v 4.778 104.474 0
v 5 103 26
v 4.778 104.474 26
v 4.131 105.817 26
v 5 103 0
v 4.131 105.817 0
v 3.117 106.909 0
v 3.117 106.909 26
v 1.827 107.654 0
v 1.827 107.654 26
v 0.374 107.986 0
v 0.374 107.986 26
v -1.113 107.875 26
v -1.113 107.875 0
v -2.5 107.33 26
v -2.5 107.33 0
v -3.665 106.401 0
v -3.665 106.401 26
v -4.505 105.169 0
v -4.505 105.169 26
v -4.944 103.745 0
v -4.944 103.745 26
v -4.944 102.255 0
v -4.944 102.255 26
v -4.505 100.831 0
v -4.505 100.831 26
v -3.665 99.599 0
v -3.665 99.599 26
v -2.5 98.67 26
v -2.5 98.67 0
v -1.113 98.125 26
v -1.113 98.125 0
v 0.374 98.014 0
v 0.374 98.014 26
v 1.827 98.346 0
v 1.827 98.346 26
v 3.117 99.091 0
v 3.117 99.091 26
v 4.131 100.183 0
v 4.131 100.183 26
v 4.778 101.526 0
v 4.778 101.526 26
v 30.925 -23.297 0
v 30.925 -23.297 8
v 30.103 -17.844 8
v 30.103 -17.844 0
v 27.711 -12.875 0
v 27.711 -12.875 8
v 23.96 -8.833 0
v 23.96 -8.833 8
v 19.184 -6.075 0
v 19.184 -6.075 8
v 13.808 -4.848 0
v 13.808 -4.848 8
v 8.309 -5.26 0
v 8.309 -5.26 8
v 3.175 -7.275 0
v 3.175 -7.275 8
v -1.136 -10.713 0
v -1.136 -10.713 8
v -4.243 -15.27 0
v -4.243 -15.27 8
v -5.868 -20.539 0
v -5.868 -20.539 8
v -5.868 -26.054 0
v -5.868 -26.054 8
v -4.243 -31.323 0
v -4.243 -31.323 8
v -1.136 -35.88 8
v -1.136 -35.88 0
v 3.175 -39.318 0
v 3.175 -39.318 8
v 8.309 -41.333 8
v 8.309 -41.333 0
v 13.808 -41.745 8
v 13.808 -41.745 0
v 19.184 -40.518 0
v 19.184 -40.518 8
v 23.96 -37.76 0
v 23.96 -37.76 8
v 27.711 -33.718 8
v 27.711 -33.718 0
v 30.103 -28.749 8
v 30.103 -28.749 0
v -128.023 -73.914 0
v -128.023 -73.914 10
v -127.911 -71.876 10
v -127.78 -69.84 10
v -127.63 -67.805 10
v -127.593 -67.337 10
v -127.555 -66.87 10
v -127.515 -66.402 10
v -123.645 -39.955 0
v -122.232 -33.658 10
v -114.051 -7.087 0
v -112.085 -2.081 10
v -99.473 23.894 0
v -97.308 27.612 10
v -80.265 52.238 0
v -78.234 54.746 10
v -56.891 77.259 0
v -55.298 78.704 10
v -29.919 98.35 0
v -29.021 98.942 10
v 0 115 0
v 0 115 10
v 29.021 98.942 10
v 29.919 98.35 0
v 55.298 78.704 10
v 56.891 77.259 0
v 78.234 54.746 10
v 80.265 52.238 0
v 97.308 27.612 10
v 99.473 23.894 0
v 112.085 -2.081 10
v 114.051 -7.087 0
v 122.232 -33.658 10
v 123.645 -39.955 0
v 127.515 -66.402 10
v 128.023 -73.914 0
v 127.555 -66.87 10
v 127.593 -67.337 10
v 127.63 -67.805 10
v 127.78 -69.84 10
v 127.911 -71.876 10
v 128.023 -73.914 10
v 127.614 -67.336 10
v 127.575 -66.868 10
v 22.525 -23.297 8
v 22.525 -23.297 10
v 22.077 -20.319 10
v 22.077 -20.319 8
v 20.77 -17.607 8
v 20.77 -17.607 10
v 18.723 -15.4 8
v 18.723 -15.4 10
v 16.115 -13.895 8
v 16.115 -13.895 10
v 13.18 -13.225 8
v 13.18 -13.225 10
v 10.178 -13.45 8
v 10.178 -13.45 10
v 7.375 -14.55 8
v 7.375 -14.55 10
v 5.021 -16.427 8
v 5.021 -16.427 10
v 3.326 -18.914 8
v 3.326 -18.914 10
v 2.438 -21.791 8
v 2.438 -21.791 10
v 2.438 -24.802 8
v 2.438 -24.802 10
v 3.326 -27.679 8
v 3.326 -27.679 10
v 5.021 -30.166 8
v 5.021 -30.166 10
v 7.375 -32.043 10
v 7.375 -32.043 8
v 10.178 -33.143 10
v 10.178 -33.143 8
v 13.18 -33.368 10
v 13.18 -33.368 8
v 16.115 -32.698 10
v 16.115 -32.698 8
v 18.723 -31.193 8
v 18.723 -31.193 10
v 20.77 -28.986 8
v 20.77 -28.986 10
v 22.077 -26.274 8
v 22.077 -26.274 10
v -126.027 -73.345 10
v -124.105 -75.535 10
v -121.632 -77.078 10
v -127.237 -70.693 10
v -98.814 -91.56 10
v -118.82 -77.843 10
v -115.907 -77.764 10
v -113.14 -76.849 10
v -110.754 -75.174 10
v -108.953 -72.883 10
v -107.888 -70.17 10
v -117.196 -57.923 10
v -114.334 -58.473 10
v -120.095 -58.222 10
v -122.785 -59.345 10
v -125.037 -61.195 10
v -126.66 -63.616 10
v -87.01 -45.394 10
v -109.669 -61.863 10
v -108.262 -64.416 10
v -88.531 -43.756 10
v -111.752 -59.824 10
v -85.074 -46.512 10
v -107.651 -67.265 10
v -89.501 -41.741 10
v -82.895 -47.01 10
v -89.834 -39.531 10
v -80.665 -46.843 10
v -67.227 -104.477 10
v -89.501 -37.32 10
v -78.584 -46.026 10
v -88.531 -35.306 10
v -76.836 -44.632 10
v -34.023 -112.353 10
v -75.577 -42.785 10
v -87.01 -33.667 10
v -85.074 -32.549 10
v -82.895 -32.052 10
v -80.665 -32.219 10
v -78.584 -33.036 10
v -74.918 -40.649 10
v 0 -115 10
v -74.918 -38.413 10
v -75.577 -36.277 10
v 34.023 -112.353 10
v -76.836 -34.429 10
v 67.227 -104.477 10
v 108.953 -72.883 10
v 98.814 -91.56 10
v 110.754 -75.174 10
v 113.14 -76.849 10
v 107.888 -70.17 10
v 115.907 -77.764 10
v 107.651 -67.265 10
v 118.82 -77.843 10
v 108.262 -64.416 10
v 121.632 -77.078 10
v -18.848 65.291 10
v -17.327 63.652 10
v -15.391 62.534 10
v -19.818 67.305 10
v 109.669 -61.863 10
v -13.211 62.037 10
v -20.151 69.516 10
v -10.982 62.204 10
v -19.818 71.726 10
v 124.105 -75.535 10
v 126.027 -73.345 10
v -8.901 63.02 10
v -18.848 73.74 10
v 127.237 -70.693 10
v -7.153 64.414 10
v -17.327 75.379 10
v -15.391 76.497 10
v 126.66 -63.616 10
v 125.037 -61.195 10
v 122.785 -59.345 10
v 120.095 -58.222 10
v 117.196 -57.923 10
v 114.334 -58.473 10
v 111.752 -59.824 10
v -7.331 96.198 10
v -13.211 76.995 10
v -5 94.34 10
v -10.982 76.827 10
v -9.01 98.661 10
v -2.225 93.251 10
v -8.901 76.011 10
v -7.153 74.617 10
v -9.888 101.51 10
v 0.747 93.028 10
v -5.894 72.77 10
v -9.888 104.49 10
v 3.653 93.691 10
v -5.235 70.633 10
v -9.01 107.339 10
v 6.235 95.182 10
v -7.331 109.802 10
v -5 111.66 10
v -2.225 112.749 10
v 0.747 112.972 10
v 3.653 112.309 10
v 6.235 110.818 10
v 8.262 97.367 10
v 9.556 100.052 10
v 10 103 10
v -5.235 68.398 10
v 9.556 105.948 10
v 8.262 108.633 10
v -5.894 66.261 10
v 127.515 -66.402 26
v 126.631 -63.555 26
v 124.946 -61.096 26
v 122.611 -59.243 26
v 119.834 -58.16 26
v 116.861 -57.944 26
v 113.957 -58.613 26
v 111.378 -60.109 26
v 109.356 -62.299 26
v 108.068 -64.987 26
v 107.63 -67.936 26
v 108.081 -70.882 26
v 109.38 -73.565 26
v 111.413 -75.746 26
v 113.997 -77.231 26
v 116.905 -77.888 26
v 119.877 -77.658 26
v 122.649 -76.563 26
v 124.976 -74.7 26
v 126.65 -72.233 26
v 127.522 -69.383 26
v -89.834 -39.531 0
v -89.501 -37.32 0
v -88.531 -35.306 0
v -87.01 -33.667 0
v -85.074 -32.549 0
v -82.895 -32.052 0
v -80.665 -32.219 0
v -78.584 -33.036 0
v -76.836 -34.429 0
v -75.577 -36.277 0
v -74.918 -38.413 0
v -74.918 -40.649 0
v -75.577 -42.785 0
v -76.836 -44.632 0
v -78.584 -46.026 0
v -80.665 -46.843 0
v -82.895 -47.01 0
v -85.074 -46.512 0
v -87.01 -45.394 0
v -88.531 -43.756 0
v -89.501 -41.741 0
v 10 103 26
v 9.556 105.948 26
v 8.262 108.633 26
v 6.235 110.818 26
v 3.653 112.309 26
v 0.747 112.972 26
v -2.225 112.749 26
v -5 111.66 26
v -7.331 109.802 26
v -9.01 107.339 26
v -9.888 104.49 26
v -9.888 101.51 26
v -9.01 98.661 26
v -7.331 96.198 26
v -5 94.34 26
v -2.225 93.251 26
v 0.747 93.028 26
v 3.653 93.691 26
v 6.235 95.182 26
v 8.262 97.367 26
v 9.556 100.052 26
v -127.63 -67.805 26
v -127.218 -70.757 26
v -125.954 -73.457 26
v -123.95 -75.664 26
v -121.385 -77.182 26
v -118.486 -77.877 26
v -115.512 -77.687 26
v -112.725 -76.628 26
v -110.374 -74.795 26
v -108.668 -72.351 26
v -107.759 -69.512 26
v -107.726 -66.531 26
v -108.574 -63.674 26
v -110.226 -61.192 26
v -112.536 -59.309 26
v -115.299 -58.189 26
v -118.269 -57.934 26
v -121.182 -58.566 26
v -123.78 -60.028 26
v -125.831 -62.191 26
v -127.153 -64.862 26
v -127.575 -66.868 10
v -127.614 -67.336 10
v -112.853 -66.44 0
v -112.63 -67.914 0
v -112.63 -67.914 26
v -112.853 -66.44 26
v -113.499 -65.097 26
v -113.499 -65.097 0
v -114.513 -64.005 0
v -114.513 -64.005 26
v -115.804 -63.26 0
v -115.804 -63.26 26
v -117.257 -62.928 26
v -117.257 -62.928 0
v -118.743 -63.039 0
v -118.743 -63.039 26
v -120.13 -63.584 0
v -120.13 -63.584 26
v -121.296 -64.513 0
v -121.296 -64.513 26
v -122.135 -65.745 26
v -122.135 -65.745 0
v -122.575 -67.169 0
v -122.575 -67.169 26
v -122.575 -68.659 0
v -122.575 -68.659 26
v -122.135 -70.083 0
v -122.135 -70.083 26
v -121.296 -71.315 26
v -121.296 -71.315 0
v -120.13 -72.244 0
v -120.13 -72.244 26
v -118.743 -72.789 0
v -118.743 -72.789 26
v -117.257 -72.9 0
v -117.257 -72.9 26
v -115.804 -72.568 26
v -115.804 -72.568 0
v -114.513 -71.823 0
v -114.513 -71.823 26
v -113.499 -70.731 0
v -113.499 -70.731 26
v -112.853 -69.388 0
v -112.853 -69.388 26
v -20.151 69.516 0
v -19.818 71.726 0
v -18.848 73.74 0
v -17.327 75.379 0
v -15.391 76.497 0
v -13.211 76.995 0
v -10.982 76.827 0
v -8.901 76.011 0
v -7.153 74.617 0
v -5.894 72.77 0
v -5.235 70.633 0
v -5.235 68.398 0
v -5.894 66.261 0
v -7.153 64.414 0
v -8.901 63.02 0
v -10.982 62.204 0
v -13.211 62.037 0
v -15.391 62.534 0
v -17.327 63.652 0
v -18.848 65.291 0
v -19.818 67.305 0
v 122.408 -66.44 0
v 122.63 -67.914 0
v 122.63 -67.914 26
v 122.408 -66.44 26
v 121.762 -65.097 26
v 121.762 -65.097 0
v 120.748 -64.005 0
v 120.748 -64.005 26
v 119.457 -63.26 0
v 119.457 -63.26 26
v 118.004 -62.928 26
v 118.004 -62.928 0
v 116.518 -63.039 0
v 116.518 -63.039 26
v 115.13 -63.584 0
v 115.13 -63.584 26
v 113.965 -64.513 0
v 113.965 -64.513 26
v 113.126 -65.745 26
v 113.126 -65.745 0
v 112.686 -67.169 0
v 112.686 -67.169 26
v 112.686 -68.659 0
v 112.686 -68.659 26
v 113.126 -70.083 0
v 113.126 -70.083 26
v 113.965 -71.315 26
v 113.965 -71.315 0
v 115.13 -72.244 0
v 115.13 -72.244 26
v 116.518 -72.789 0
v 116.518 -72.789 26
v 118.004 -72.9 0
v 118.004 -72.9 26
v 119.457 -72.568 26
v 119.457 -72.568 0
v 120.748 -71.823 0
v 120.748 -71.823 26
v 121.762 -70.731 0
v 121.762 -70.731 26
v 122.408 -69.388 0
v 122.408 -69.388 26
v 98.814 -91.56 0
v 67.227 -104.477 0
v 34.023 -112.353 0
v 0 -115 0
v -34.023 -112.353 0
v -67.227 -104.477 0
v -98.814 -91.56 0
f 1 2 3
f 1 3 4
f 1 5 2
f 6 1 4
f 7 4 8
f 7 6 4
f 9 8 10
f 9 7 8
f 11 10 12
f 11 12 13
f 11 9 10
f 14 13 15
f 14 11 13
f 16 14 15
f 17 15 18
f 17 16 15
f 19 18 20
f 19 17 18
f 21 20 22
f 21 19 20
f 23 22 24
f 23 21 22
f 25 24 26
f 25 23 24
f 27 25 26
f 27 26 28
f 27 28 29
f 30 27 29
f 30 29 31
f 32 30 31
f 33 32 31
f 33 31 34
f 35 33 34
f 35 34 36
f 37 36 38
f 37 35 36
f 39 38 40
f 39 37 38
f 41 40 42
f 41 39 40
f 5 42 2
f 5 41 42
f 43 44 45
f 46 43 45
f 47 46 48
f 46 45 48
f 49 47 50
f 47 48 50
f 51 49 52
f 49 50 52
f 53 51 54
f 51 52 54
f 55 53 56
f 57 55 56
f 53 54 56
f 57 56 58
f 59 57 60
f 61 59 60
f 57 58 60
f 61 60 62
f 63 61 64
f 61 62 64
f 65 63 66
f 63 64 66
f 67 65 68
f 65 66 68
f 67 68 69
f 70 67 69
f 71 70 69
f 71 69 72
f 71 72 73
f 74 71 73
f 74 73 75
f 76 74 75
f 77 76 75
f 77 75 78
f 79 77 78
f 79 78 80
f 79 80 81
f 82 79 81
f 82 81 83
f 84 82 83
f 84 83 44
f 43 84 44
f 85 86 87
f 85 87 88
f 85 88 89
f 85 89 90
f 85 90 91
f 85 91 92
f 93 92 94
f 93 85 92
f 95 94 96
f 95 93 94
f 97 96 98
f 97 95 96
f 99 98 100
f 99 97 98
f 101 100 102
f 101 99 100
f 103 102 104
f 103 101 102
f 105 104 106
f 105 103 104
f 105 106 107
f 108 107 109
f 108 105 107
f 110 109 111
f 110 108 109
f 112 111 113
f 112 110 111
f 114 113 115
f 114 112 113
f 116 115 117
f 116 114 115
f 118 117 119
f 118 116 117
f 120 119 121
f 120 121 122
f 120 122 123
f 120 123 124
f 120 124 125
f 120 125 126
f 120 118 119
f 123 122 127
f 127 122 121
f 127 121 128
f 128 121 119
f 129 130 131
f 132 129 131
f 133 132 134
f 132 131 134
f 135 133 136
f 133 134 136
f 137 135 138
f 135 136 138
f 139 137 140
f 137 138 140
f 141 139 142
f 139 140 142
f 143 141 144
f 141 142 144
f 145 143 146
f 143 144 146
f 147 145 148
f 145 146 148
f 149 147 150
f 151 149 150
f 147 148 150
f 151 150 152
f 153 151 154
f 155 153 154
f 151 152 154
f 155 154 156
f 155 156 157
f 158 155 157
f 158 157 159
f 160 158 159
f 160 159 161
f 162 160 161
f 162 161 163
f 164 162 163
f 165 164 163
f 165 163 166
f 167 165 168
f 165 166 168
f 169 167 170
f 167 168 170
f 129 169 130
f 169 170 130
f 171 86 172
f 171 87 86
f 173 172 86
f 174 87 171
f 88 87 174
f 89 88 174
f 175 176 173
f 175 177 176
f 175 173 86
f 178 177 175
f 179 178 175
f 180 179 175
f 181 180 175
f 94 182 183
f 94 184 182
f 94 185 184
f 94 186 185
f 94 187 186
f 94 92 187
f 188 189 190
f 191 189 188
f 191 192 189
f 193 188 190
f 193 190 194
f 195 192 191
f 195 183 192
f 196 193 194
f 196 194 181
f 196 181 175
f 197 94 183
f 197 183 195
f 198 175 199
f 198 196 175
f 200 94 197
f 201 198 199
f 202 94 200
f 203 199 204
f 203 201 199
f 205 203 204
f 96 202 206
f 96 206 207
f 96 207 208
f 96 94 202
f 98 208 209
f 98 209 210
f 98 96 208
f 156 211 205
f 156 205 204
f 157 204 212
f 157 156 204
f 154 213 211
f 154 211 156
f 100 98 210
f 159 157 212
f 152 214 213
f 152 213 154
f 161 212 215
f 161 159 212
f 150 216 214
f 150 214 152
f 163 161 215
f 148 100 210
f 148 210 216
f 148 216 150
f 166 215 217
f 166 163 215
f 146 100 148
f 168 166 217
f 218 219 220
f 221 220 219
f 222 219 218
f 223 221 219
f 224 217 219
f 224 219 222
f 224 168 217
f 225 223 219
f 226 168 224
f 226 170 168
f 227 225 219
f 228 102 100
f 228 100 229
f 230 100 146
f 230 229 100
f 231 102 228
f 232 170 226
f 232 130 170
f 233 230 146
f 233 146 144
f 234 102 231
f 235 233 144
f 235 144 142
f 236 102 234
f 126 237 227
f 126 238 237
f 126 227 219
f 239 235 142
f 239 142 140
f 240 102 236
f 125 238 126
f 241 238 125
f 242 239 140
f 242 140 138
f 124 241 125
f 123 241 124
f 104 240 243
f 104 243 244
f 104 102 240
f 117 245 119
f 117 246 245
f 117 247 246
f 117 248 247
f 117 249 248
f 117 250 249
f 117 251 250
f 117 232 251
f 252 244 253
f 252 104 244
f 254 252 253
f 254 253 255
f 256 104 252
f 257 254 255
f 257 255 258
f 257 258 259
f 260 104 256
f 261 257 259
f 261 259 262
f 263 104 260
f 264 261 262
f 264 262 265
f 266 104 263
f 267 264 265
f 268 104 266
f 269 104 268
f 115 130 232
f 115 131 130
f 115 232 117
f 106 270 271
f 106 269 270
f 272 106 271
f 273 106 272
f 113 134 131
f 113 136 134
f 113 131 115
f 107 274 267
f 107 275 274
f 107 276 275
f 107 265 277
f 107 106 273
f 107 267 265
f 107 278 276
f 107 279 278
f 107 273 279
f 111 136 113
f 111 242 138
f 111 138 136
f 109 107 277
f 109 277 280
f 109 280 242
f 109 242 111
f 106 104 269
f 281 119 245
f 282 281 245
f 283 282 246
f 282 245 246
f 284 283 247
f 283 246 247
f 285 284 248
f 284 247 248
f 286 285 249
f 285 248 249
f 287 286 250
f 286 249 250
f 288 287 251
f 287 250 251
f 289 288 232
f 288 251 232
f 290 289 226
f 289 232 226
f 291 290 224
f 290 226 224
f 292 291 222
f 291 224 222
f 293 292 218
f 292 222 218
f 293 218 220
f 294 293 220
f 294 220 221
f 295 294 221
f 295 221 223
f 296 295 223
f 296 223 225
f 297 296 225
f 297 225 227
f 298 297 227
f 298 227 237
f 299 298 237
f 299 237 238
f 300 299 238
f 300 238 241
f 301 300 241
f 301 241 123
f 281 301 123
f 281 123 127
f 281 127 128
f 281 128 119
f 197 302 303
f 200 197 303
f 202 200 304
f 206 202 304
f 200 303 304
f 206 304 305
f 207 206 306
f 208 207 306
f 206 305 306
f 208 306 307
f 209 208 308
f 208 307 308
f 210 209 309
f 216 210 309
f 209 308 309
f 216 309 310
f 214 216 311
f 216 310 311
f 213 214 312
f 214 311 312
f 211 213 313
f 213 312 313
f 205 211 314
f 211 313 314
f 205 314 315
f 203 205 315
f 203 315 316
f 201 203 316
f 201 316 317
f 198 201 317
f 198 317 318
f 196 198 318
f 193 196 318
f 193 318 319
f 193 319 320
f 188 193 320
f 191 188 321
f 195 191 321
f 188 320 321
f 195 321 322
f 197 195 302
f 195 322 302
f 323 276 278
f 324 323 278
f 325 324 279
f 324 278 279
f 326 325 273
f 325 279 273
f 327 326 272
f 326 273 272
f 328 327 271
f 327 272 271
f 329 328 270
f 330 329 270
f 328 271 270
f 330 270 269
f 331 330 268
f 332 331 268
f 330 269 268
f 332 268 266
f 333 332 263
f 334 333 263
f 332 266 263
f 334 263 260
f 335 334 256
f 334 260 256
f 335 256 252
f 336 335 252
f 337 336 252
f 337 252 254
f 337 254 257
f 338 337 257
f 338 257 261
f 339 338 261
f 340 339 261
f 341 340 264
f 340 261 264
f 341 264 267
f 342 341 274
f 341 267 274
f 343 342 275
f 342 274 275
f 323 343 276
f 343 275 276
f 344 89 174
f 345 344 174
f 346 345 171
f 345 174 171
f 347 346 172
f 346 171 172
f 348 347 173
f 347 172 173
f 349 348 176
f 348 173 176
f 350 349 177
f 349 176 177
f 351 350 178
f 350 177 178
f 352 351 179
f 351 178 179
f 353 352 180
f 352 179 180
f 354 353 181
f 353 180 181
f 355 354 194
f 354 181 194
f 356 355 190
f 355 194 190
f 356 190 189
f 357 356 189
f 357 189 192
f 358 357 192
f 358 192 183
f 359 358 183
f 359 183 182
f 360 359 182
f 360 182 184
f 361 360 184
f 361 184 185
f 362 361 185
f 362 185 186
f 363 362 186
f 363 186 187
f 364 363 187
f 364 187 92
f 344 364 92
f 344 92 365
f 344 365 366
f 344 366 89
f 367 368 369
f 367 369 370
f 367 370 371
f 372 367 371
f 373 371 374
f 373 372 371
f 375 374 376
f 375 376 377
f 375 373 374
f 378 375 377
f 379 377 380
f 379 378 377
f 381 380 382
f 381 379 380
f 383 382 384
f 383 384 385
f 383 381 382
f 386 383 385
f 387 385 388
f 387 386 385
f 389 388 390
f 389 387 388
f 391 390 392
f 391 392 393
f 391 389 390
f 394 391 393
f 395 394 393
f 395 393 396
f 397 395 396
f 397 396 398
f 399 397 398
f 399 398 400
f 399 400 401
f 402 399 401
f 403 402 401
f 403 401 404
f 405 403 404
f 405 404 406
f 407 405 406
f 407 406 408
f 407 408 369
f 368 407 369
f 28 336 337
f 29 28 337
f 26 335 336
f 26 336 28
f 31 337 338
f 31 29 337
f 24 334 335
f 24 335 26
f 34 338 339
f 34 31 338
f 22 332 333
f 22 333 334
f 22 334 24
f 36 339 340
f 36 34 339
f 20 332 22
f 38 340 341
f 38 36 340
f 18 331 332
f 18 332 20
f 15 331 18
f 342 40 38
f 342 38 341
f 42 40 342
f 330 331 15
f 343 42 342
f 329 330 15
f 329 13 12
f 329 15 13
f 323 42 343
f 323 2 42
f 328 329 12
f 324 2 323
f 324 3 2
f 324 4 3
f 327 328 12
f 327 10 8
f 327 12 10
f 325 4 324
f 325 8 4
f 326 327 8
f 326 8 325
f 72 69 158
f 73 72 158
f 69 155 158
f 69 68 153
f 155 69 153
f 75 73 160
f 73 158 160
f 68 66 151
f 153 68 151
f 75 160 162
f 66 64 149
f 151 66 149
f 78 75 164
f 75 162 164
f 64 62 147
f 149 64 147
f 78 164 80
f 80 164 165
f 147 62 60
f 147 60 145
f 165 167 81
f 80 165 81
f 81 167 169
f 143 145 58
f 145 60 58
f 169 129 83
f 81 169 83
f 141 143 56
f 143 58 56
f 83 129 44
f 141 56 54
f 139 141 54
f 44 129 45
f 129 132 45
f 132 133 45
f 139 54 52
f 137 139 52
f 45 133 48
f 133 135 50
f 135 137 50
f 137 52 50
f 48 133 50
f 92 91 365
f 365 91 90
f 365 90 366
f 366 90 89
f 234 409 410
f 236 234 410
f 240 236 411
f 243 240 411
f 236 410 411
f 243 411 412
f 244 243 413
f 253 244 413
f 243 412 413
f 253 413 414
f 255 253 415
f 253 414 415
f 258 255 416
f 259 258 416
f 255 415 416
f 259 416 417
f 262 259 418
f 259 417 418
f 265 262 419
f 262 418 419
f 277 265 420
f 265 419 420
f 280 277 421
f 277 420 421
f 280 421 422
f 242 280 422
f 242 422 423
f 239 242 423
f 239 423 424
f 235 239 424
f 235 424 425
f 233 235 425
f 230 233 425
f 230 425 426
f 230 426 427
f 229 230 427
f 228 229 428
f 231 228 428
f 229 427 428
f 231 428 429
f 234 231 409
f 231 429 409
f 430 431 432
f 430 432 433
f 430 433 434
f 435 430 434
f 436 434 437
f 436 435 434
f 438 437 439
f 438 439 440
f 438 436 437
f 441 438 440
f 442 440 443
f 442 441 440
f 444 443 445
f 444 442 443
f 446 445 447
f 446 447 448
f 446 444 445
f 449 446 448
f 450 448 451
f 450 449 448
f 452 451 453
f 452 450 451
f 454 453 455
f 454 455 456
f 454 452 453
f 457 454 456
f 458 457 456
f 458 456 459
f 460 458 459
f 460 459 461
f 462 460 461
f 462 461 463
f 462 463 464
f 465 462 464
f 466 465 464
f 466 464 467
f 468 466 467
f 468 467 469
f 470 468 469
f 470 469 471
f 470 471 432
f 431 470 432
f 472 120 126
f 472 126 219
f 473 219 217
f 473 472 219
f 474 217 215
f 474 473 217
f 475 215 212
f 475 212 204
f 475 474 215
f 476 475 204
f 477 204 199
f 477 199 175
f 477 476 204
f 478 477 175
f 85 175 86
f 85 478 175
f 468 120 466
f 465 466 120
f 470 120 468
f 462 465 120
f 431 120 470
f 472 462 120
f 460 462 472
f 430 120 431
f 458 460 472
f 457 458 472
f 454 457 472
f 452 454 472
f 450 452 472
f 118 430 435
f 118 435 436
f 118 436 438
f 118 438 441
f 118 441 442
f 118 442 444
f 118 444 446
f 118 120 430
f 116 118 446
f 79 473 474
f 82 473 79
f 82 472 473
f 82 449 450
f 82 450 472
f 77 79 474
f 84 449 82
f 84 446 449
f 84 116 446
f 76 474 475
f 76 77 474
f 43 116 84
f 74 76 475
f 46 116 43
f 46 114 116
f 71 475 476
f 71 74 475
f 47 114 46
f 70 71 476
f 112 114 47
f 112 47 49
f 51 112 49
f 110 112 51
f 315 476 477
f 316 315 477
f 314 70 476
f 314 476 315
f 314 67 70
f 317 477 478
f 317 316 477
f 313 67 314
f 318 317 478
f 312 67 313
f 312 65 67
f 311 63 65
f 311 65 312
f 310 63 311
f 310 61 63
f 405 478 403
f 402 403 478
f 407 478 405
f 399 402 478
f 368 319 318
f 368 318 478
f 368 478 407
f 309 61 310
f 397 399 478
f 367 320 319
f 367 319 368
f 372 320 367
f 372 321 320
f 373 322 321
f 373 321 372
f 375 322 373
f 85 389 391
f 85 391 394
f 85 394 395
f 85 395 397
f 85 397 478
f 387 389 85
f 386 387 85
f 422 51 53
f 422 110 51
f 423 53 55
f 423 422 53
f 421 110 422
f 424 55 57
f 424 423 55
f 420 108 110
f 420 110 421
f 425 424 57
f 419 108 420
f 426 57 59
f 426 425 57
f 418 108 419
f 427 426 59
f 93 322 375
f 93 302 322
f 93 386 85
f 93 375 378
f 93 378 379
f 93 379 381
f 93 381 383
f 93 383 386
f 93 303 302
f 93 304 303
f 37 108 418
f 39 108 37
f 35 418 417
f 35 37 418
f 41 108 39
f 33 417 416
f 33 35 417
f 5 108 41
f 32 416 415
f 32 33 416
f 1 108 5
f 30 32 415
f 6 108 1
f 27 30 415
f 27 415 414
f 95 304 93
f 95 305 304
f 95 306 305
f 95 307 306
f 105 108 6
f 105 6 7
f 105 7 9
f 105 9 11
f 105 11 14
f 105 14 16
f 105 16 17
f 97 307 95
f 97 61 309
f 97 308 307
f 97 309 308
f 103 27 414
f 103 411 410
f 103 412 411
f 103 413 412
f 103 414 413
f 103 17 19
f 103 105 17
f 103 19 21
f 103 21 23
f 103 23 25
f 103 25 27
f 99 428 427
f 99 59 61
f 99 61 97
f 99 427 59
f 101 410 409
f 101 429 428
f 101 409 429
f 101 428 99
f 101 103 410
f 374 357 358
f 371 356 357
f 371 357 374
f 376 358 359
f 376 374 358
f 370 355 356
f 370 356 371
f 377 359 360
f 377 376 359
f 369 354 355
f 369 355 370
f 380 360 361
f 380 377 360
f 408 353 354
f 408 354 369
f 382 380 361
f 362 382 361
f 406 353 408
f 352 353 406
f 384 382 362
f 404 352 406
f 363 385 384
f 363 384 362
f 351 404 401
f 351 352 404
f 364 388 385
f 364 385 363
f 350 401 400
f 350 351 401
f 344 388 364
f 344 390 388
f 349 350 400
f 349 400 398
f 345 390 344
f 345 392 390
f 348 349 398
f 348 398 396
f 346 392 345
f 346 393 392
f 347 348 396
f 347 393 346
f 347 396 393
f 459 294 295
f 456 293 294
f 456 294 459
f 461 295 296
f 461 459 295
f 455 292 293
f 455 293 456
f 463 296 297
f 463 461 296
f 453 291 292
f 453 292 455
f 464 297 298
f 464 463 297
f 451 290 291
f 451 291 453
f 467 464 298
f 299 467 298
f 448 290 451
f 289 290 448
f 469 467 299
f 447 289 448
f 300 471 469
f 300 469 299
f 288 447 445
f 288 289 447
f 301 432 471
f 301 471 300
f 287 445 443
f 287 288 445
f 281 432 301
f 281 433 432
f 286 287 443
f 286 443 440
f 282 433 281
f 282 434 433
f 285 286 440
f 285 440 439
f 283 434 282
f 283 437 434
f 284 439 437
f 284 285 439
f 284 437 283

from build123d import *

# Parameters (mm, degrees)
SKETCH_1_R          = 5
EXTRUDE_1_DEPTH     = 10
SKETCH_2_R          = 10
SKETCH_2_R_2        = 5
EXTRUDE_2_DEPTH     = 16
SKETCH_3_R          = 7.5
CUT_EXTRUDE_1_DEPTH = 10
SKETCH_4_R          = 18.5
CUT_EXTRUDE_2_DEPTH = 10
SKETCH_5_R          = 18.5
SKETCH_5_R_2        = 10.1
EXTRUDE_3_DEPTH     = 2


with BuildPart() as part:
    # 草图1 → 凸台-拉伸1 (new body)
    with BuildSketch(Plane.XY):
        with BuildLine():
            ThreePointArc((-128.022678922, -73.913928138), (-90.421378279, 38.440519474), (0, 115))
            ThreePointArc((0, 115), (90.421378279, 38.440519474), (128.022678922, -73.913928138))
            ThreePointArc((128.022678922, -73.913928138), (0, -115), (-128.022678922, -73.913928138))
        make_face()
        with Locations((0, 103)):
            Circle(SKETCH_1_R, mode=Mode.SUBTRACT)
        with Locations((-117.630374076, -67.913928138)):
            Circle(SKETCH_1_R, mode=Mode.SUBTRACT)
        with Locations((117.630374076, -67.913928138)):
            Circle(SKETCH_1_R, mode=Mode.SUBTRACT)
    extrude(amount=EXTRUDE_1_DEPTH)

    # 草图2 → 凸台-拉伸2 (add)
    # profile 1 of 3: a face of its own
    with BuildSketch(Plane.XY.offset(10)):
        with Locations((0, 103)):
            Circle(SKETCH_2_R)
        with Locations((0, 103)):
            Circle(SKETCH_2_R_2, mode=Mode.SUBTRACT)
    # profile 2 of 3: a face of its own
    with BuildSketch(Plane.XY.offset(10)):
        with Locations(Location((-117.630374076, -67.913928138, 0), (0, 0, 179.375778052))):
            Circle(SKETCH_2_R)
        with Locations((-117.630374076, -67.913928138)):
            Circle(SKETCH_2_R_2, mode=Mode.SUBTRACT)
    # profile 3 of 3: a face of its own
    with BuildSketch(Plane.XY.offset(10)):
        with Locations(Location((117.630374076, -67.913928138, 0), (0, 0, 8.696571879))):
            Circle(SKETCH_2_R)
        with Locations((117.630374076, -67.913928138)):
            Circle(SKETCH_2_R_2, mode=Mode.SUBTRACT)
    extrude(amount=EXTRUDE_2_DEPTH)

    # 草图3 → 切除-拉伸1 (cut)
    with BuildSketch(Plane(origin=(0, 0, 0), x_dir=(-1, 0, 0), z_dir=(0, 0, -1))):
        with Locations((12.650995066, 69.515536741)):
            Circle(SKETCH_3_R)
        with Locations((82.334125615, -39.530718783)):
            Circle(SKETCH_3_R)
    extrude(amount=-CUT_EXTRUDE_1_DEPTH, mode=Mode.SUBTRACT)

    # 草图4 → 切除-拉伸2 (cut)
    with BuildSketch(Plane.XY.offset(10)):
        with Locations((12.425309319, -23.296523673)):
            Circle(SKETCH_4_R)
    extrude(amount=-CUT_EXTRUDE_2_DEPTH, mode=Mode.SUBTRACT)

    # 草图5 → 凸台-拉伸3 (add)
    with BuildSketch(Plane.XY.offset(10)):
        with Locations((12.425309319, -23.296523673)):
            Circle(SKETCH_5_R)
        with Locations((12.425309319, -23.296523673)):
            Circle(SKETCH_5_R_2, mode=Mode.SUBTRACT)
    extrude(amount=-EXTRUDE_3_DEPTH)


solid = part.part
